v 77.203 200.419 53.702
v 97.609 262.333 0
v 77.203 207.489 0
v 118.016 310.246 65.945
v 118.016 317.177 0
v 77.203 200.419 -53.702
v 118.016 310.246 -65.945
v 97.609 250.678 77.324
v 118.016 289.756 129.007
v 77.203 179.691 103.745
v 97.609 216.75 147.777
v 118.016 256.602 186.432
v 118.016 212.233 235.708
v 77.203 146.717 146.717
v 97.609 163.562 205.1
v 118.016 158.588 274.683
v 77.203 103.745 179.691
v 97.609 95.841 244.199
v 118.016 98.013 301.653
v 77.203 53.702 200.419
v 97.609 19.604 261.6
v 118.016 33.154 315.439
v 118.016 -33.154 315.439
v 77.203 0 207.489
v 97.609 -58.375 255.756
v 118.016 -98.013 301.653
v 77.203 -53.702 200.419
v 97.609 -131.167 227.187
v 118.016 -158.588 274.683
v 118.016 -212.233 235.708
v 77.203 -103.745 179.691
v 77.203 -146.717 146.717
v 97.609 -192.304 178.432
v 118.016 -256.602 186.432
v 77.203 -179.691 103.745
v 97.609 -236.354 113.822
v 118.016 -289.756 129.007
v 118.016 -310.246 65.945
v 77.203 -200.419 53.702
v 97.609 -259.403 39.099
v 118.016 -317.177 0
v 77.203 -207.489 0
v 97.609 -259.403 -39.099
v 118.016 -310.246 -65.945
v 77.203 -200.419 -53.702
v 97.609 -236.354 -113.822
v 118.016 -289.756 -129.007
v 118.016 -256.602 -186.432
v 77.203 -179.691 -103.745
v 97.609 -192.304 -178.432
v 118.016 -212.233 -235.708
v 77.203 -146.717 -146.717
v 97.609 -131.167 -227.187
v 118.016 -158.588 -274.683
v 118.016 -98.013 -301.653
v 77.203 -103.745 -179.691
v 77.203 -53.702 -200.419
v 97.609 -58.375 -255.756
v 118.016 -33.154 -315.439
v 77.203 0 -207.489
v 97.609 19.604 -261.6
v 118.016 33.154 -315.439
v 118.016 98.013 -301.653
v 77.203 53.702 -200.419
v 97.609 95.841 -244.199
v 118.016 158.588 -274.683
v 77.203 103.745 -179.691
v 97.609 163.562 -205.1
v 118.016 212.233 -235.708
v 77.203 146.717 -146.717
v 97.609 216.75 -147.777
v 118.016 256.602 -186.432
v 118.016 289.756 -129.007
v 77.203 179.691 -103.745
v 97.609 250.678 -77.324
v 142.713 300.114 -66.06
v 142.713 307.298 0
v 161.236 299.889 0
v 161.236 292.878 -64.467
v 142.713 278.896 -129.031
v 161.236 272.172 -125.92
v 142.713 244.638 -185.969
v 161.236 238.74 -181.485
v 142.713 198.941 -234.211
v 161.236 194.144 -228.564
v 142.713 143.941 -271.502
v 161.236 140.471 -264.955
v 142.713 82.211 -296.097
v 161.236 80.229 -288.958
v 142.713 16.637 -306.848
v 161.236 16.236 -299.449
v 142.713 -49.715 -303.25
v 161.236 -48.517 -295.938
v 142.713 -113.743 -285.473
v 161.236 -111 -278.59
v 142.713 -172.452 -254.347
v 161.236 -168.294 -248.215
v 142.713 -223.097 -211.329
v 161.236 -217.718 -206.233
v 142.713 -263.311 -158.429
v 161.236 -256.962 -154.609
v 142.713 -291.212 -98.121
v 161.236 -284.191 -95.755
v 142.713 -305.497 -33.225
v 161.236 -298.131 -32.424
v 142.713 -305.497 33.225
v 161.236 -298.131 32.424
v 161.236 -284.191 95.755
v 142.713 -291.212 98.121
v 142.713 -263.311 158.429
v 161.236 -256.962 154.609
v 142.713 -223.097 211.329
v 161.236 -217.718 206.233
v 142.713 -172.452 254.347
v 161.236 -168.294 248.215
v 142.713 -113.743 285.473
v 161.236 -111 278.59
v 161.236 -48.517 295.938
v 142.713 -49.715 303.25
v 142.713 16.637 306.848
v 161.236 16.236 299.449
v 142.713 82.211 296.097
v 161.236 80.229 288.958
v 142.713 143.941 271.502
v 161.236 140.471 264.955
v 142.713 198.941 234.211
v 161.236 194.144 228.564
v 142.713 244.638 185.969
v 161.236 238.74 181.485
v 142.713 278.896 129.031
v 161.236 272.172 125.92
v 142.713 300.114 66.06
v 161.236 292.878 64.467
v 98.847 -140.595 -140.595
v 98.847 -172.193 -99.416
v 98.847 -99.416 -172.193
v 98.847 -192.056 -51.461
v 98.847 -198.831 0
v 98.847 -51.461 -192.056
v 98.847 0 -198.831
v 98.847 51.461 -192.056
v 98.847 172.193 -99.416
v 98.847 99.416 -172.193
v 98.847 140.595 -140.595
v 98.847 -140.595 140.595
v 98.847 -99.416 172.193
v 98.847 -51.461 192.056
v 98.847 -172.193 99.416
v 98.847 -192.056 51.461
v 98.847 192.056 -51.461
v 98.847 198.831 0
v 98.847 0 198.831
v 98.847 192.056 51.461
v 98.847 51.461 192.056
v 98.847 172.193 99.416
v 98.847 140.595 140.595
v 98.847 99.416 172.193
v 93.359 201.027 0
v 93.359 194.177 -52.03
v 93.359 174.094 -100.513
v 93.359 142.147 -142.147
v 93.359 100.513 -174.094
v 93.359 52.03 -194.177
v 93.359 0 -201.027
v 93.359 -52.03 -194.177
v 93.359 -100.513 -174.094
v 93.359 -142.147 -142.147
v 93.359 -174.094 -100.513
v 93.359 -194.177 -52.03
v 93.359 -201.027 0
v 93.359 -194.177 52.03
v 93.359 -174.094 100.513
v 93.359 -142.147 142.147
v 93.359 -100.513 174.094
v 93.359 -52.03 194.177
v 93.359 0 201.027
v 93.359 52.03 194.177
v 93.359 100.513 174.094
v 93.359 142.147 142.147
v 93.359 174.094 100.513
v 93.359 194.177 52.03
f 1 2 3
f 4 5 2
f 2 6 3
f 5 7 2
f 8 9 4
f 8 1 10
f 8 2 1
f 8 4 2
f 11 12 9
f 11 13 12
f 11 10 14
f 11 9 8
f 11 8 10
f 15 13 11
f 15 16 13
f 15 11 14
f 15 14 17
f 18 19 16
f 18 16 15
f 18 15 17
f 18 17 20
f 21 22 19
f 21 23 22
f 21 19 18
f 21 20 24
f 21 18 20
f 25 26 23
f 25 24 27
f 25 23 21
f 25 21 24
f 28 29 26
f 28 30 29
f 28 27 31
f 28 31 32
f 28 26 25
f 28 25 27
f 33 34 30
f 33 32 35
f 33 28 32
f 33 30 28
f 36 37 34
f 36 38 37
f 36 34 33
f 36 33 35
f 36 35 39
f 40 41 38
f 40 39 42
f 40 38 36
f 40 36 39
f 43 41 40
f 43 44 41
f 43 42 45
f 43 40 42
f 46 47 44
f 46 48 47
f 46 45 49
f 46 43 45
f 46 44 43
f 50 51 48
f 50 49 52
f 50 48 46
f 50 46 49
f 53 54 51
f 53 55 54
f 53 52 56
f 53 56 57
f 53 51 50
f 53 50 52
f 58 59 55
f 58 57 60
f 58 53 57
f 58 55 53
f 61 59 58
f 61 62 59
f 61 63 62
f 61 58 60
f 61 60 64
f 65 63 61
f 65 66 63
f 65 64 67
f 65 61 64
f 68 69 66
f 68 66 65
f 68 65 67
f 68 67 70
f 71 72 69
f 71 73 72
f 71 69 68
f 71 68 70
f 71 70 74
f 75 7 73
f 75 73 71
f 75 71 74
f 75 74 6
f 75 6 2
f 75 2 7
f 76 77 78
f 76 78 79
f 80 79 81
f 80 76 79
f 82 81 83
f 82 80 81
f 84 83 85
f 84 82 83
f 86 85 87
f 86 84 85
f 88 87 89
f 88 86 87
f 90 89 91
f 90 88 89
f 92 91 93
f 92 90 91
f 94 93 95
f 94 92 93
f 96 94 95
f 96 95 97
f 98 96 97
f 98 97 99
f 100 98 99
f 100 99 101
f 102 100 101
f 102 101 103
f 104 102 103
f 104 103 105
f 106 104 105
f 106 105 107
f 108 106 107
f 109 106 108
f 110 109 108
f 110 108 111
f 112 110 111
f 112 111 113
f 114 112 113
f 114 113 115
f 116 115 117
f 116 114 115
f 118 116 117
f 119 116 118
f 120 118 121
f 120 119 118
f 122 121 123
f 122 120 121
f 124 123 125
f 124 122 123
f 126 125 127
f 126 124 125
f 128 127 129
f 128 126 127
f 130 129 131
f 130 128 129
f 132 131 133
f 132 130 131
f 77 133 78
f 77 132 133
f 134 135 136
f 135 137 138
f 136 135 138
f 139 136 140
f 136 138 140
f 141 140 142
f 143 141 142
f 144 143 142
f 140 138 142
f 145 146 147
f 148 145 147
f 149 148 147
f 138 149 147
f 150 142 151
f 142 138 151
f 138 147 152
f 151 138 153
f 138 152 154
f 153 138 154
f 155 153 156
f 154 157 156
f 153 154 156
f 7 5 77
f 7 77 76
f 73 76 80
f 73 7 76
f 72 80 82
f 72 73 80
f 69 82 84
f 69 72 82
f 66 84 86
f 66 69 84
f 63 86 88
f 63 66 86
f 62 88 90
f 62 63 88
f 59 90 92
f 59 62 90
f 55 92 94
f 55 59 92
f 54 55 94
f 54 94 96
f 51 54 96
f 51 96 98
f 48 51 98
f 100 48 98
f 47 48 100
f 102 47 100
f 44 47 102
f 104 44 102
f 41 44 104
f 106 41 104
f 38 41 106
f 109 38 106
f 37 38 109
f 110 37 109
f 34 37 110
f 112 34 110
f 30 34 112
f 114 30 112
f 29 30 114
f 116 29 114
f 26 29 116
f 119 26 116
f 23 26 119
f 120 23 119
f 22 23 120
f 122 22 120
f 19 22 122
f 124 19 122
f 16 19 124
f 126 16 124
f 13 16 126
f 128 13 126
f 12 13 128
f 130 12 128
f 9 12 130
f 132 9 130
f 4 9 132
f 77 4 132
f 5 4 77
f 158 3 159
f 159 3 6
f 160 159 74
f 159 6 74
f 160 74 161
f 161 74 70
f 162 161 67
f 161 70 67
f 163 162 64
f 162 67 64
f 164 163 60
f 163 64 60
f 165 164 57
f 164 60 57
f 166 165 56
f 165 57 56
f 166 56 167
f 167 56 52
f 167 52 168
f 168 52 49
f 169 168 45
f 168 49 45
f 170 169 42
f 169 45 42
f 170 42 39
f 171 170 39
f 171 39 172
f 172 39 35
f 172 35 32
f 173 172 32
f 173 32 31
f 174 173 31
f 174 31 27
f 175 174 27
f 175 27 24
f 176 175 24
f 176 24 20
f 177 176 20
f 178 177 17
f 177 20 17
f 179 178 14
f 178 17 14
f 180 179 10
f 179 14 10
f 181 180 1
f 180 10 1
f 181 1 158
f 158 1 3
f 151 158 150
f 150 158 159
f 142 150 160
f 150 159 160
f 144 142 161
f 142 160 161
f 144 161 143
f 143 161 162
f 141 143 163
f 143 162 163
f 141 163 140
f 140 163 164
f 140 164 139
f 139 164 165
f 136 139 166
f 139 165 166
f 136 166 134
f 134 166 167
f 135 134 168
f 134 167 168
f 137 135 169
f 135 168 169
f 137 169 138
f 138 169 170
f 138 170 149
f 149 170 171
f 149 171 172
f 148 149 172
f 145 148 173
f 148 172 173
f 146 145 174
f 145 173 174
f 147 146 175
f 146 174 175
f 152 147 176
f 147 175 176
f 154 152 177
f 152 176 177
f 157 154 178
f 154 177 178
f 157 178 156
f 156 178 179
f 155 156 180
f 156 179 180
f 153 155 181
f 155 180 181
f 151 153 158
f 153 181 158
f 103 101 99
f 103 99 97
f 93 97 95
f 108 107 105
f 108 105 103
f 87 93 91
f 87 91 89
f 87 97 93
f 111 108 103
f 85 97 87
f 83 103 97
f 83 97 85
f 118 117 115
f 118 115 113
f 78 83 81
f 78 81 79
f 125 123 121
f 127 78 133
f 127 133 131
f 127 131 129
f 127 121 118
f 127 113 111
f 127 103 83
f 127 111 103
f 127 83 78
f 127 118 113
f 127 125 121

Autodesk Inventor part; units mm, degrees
ref_plane "YZ Plane" through (0, 0, 0) normal (1, 0, 0) x (0, 1, 0)
ref_plane "XZ Plane" through (0, 0, 0) normal (0, 1, 0) x (-1, 0, 0)
ref_plane "Work Plane1" through (0, 0, -10) normal (-1, 0, 0) x (0, -1, 0)
sketch "Sketch1" plane through (0, 0, 0) normal (0, 0, 1) x (1, 0, 0)
  line L0 (-21.83974, 0) -> (131.038441, 0)
  line L1 (0, 0) -> (11.555806, 28.889516) construction
  line L2 (93.359081, 201.02678) -> (142.712708, 307.298186)
  line L3 (93.359081, 201.02678) -> (98.847306, 198.83149)
  line L4 (98.847306, 198.83149) -> (98.847306, 0)
  line L5 (142.712708, 307.298186) -> (161.235818, 299.888942)
  line L6 (161.235818, 299.888942) -> (161.235818, 0)
  dimension "delta" = 68.1986
  dimension "hxe" = 19.95
  dimension "hxi" = 5.911
  dimension "hfe" = 18.37774
  dimension "hfi" = 12.02226
  dimension "Ri" = 221.32137
  dimension "b" = 117
sketch "Sketch1 outline for Revolution1" plane through (0, 0, 0) normal (0, 0, 1) x (1, 0, 0)
  line L0 (98.847306, 198.83149) -> (98.847306, 0)
  line L1 (93.359081, 201.02678) -> (98.847306, 198.83149)
  line L2 (142.712708, 307.298186) -> (93.359081, 201.02678)
  line L3 (161.235818, 299.888942) -> (142.712708, 307.298186)
  line L4 (161.235818, 0) -> (161.235818, 299.888942)
  line L5 (98.847306, 0) -> (161.235818, 0)
revolve "Revolution1" add sketch "Sketch1 outline for Revolution1" angle 360 about axis through (-10, 0, 0) along (1, 0, 0)
sketch "Sketch2" plane through (0, 0, 0) normal (0, 0, 1) x (1, 0, 0)
  line L0 (-20.687045, 0) -> (124.12227, 0)
  line L1 (0, 0) -> (11.984241, 29.960604) construction
  line L2 (93.359081, 201.02678) -> (142.712708, 307.298186)
  line L3 (93.359081, 201.02678) -> (77.202995, 207.489214)
  line L4 (142.712708, 307.298186) -> (118.015819, 317.176941)
  line L5 (118.015819, 317.176941) -> (77.202995, 207.489214)
  dimension "hae" = 8.22162
  dimension "hai" = 5.37838
  dimension "d10" = 68.1986
revolve "Revolution2" add sketch "Sketch2" angle 360 about axis through (-10, 0, 0) along (1, 0, 0)
equation "\"delta\" = MC_delta2"
equation "\"hxe\" = MC_hxe2 + MC_hae2 - MC_h2E"
equation "\"hxi\" = MC_hxi2 + MC_hai2 - MC_h2A"
equation "\"hfe\" = MC_h2E - MC_hae2"
equation "\"hfi\" = MC_h2A - MC_hai2"
equation "\"Ri\" = MC_Ri"
equation "\"b\" = MC_b"
equation "\"hae\" = MC_hae2"
equation "\"hai\" = MC_hai2"
equation "\"d10\" = delta"
equation "\"SumDelta\" = MC_deltasum"
equation "\"MC_deltasum\" = 90deg"
equation "\"MC_b\" = 117"
equation "\"MC_Ri\" = 221.32137"
equation "\"MC_alfa\" = 20deg"
equation "\"MC_delta1\" = 21.801409deg"
equation "\"MC_hae1\" = 15.95962"
equation "\"MC_hxe1\" = 23.93975"
equation "\"MC_hai1\" = 10.44038"
equation "\"MC_hxi1\" = 11.79625"
equation "\"MC_delta2\" = 68.1986deg"
equation "\"MC_hae2\" = 8.22162"
equation "\"MC_hxe2\" = 38.32774"
equation "\"MC_hai2\" = 5.37838"
equation "\"MC_hxi2\" = 17.93326"
equation "\"MC_Ang1A\" = 203.543093deg"
equation "\"MC_Ang1B\" = 190.397416deg"
equation "\"MC_Ang1C\" = 180deg"
equation "\"MC_Ang1D\" = 171.570572deg"
equation "\"MC_Ang1E\" = 164.598698deg"
equation "\"MC_Ang2A\" = 170.582763deg"
equation "\"MC_Ang2B\" = 175.841034deg"
equation "\"MC_Ang2C\" = 180deg"
equation "\"MC_Ang2D\" = 183.371771deg"
equation "\"MC_Ang2E\" = 186.160521deg"
equation "\"MC_h1A\" = 17.40064"
equation "\"MC_h1B\" = 19.70032"
equation "\"MC_h1C\" = 22"
equation "\"MC_h1D\" = 24.29968"
equation "\"MC_h1E\" = 26.59936"
equation "\"MC_h2A\" = 17.40064"
equation "\"MC_h2B\" = 19.70032"
equation "\"MC_h2C\" = 22"
equation "\"MC_h2D\" = 24.29968"
equation "\"MC_h2E\" = 26.59936"
equation "\"MC_Rz1A\" = 82.19669"
equation "\"MC_Rz1B\" = 93.05987"
equation "\"MC_Rz1C\" = 103.92305"
equation "\"MC_Rz1D\" = 114.78623"
equation "\"MC_Rz1E\" = 125.6494"
equation "\"MC_Rz2A\" = 205.49173"
equation "\"MC_Rz2B\" = 232.64968"
equation "\"MC_Rz2C\" = 259.80762"
equation "\"MC_Rz2D\" = 286.96556"
equation "\"MC_Rz2E\" = 314.12351"
equation "\"MC_Sa1A\" = 2.90562"
equation "\"MC_Sa1B\" = 3.28962"
equation "\"MC_Sa1C\" = 3.67363"
equation "\"MC_Sa1D\" = 4.05764"
equation "\"MC_Sa1E\" = 4.44165"
equation "\"MC_Sa2A\" = 4.42236"
equation "\"MC_Sa2B\" = 5.00682"
equation "\"MC_Sa2C\" = 5.59128"
equation "\"MC_Sa2D\" = 6.17574"
equation "\"MC_Sa2E\" = 6.7602"
equation "\"MC_tx1A\" = 13.29713"
equation "\"MC_tx1B\" = 15.05449"
equation "\"MC_tx1C\" = 16.81185"
equation "\"MC_tx1D\" = 18.56921"
equation "\"MC_tx1E\" = 20.32657"
equation "\"MC_tx2A\" = 10.0867"
equation "\"MC_tx2B\" = 11.41977"
equation "\"MC_tx2C\" = 12.75284"
equation "\"MC_tx2D\" = 14.0859"
equation "\"MC_tx2E\" = 15.41897"
equation "\"MC_bD\" = 29.25"
equation "\"MC_bC\" = 58.5"
equation "\"MC_bB\" = 87.75"
equation "\"MC_bA\" = 119.34"
equation "\"MC_mx1A\" = 7.47431"
equation "\"MC_mx1B\" = 8.46212"
equation "\"MC_mx1C\" = 9.44993"
equation "\"MC_mx1D\" = 10.43775"
equation "\"MC_mx1E\" = 11.42556"
equation "\"MC_mx2A\" = 7.05073"
equation "\"MC_mx2B\" = 7.98256"
equation "\"MC_mx2C\" = 8.91439"
equation "\"MC_mx2D\" = 9.84622"
equation "\"MC_mx2E\" = 10.77805"
properties part number "bevelgear_wheel2"
